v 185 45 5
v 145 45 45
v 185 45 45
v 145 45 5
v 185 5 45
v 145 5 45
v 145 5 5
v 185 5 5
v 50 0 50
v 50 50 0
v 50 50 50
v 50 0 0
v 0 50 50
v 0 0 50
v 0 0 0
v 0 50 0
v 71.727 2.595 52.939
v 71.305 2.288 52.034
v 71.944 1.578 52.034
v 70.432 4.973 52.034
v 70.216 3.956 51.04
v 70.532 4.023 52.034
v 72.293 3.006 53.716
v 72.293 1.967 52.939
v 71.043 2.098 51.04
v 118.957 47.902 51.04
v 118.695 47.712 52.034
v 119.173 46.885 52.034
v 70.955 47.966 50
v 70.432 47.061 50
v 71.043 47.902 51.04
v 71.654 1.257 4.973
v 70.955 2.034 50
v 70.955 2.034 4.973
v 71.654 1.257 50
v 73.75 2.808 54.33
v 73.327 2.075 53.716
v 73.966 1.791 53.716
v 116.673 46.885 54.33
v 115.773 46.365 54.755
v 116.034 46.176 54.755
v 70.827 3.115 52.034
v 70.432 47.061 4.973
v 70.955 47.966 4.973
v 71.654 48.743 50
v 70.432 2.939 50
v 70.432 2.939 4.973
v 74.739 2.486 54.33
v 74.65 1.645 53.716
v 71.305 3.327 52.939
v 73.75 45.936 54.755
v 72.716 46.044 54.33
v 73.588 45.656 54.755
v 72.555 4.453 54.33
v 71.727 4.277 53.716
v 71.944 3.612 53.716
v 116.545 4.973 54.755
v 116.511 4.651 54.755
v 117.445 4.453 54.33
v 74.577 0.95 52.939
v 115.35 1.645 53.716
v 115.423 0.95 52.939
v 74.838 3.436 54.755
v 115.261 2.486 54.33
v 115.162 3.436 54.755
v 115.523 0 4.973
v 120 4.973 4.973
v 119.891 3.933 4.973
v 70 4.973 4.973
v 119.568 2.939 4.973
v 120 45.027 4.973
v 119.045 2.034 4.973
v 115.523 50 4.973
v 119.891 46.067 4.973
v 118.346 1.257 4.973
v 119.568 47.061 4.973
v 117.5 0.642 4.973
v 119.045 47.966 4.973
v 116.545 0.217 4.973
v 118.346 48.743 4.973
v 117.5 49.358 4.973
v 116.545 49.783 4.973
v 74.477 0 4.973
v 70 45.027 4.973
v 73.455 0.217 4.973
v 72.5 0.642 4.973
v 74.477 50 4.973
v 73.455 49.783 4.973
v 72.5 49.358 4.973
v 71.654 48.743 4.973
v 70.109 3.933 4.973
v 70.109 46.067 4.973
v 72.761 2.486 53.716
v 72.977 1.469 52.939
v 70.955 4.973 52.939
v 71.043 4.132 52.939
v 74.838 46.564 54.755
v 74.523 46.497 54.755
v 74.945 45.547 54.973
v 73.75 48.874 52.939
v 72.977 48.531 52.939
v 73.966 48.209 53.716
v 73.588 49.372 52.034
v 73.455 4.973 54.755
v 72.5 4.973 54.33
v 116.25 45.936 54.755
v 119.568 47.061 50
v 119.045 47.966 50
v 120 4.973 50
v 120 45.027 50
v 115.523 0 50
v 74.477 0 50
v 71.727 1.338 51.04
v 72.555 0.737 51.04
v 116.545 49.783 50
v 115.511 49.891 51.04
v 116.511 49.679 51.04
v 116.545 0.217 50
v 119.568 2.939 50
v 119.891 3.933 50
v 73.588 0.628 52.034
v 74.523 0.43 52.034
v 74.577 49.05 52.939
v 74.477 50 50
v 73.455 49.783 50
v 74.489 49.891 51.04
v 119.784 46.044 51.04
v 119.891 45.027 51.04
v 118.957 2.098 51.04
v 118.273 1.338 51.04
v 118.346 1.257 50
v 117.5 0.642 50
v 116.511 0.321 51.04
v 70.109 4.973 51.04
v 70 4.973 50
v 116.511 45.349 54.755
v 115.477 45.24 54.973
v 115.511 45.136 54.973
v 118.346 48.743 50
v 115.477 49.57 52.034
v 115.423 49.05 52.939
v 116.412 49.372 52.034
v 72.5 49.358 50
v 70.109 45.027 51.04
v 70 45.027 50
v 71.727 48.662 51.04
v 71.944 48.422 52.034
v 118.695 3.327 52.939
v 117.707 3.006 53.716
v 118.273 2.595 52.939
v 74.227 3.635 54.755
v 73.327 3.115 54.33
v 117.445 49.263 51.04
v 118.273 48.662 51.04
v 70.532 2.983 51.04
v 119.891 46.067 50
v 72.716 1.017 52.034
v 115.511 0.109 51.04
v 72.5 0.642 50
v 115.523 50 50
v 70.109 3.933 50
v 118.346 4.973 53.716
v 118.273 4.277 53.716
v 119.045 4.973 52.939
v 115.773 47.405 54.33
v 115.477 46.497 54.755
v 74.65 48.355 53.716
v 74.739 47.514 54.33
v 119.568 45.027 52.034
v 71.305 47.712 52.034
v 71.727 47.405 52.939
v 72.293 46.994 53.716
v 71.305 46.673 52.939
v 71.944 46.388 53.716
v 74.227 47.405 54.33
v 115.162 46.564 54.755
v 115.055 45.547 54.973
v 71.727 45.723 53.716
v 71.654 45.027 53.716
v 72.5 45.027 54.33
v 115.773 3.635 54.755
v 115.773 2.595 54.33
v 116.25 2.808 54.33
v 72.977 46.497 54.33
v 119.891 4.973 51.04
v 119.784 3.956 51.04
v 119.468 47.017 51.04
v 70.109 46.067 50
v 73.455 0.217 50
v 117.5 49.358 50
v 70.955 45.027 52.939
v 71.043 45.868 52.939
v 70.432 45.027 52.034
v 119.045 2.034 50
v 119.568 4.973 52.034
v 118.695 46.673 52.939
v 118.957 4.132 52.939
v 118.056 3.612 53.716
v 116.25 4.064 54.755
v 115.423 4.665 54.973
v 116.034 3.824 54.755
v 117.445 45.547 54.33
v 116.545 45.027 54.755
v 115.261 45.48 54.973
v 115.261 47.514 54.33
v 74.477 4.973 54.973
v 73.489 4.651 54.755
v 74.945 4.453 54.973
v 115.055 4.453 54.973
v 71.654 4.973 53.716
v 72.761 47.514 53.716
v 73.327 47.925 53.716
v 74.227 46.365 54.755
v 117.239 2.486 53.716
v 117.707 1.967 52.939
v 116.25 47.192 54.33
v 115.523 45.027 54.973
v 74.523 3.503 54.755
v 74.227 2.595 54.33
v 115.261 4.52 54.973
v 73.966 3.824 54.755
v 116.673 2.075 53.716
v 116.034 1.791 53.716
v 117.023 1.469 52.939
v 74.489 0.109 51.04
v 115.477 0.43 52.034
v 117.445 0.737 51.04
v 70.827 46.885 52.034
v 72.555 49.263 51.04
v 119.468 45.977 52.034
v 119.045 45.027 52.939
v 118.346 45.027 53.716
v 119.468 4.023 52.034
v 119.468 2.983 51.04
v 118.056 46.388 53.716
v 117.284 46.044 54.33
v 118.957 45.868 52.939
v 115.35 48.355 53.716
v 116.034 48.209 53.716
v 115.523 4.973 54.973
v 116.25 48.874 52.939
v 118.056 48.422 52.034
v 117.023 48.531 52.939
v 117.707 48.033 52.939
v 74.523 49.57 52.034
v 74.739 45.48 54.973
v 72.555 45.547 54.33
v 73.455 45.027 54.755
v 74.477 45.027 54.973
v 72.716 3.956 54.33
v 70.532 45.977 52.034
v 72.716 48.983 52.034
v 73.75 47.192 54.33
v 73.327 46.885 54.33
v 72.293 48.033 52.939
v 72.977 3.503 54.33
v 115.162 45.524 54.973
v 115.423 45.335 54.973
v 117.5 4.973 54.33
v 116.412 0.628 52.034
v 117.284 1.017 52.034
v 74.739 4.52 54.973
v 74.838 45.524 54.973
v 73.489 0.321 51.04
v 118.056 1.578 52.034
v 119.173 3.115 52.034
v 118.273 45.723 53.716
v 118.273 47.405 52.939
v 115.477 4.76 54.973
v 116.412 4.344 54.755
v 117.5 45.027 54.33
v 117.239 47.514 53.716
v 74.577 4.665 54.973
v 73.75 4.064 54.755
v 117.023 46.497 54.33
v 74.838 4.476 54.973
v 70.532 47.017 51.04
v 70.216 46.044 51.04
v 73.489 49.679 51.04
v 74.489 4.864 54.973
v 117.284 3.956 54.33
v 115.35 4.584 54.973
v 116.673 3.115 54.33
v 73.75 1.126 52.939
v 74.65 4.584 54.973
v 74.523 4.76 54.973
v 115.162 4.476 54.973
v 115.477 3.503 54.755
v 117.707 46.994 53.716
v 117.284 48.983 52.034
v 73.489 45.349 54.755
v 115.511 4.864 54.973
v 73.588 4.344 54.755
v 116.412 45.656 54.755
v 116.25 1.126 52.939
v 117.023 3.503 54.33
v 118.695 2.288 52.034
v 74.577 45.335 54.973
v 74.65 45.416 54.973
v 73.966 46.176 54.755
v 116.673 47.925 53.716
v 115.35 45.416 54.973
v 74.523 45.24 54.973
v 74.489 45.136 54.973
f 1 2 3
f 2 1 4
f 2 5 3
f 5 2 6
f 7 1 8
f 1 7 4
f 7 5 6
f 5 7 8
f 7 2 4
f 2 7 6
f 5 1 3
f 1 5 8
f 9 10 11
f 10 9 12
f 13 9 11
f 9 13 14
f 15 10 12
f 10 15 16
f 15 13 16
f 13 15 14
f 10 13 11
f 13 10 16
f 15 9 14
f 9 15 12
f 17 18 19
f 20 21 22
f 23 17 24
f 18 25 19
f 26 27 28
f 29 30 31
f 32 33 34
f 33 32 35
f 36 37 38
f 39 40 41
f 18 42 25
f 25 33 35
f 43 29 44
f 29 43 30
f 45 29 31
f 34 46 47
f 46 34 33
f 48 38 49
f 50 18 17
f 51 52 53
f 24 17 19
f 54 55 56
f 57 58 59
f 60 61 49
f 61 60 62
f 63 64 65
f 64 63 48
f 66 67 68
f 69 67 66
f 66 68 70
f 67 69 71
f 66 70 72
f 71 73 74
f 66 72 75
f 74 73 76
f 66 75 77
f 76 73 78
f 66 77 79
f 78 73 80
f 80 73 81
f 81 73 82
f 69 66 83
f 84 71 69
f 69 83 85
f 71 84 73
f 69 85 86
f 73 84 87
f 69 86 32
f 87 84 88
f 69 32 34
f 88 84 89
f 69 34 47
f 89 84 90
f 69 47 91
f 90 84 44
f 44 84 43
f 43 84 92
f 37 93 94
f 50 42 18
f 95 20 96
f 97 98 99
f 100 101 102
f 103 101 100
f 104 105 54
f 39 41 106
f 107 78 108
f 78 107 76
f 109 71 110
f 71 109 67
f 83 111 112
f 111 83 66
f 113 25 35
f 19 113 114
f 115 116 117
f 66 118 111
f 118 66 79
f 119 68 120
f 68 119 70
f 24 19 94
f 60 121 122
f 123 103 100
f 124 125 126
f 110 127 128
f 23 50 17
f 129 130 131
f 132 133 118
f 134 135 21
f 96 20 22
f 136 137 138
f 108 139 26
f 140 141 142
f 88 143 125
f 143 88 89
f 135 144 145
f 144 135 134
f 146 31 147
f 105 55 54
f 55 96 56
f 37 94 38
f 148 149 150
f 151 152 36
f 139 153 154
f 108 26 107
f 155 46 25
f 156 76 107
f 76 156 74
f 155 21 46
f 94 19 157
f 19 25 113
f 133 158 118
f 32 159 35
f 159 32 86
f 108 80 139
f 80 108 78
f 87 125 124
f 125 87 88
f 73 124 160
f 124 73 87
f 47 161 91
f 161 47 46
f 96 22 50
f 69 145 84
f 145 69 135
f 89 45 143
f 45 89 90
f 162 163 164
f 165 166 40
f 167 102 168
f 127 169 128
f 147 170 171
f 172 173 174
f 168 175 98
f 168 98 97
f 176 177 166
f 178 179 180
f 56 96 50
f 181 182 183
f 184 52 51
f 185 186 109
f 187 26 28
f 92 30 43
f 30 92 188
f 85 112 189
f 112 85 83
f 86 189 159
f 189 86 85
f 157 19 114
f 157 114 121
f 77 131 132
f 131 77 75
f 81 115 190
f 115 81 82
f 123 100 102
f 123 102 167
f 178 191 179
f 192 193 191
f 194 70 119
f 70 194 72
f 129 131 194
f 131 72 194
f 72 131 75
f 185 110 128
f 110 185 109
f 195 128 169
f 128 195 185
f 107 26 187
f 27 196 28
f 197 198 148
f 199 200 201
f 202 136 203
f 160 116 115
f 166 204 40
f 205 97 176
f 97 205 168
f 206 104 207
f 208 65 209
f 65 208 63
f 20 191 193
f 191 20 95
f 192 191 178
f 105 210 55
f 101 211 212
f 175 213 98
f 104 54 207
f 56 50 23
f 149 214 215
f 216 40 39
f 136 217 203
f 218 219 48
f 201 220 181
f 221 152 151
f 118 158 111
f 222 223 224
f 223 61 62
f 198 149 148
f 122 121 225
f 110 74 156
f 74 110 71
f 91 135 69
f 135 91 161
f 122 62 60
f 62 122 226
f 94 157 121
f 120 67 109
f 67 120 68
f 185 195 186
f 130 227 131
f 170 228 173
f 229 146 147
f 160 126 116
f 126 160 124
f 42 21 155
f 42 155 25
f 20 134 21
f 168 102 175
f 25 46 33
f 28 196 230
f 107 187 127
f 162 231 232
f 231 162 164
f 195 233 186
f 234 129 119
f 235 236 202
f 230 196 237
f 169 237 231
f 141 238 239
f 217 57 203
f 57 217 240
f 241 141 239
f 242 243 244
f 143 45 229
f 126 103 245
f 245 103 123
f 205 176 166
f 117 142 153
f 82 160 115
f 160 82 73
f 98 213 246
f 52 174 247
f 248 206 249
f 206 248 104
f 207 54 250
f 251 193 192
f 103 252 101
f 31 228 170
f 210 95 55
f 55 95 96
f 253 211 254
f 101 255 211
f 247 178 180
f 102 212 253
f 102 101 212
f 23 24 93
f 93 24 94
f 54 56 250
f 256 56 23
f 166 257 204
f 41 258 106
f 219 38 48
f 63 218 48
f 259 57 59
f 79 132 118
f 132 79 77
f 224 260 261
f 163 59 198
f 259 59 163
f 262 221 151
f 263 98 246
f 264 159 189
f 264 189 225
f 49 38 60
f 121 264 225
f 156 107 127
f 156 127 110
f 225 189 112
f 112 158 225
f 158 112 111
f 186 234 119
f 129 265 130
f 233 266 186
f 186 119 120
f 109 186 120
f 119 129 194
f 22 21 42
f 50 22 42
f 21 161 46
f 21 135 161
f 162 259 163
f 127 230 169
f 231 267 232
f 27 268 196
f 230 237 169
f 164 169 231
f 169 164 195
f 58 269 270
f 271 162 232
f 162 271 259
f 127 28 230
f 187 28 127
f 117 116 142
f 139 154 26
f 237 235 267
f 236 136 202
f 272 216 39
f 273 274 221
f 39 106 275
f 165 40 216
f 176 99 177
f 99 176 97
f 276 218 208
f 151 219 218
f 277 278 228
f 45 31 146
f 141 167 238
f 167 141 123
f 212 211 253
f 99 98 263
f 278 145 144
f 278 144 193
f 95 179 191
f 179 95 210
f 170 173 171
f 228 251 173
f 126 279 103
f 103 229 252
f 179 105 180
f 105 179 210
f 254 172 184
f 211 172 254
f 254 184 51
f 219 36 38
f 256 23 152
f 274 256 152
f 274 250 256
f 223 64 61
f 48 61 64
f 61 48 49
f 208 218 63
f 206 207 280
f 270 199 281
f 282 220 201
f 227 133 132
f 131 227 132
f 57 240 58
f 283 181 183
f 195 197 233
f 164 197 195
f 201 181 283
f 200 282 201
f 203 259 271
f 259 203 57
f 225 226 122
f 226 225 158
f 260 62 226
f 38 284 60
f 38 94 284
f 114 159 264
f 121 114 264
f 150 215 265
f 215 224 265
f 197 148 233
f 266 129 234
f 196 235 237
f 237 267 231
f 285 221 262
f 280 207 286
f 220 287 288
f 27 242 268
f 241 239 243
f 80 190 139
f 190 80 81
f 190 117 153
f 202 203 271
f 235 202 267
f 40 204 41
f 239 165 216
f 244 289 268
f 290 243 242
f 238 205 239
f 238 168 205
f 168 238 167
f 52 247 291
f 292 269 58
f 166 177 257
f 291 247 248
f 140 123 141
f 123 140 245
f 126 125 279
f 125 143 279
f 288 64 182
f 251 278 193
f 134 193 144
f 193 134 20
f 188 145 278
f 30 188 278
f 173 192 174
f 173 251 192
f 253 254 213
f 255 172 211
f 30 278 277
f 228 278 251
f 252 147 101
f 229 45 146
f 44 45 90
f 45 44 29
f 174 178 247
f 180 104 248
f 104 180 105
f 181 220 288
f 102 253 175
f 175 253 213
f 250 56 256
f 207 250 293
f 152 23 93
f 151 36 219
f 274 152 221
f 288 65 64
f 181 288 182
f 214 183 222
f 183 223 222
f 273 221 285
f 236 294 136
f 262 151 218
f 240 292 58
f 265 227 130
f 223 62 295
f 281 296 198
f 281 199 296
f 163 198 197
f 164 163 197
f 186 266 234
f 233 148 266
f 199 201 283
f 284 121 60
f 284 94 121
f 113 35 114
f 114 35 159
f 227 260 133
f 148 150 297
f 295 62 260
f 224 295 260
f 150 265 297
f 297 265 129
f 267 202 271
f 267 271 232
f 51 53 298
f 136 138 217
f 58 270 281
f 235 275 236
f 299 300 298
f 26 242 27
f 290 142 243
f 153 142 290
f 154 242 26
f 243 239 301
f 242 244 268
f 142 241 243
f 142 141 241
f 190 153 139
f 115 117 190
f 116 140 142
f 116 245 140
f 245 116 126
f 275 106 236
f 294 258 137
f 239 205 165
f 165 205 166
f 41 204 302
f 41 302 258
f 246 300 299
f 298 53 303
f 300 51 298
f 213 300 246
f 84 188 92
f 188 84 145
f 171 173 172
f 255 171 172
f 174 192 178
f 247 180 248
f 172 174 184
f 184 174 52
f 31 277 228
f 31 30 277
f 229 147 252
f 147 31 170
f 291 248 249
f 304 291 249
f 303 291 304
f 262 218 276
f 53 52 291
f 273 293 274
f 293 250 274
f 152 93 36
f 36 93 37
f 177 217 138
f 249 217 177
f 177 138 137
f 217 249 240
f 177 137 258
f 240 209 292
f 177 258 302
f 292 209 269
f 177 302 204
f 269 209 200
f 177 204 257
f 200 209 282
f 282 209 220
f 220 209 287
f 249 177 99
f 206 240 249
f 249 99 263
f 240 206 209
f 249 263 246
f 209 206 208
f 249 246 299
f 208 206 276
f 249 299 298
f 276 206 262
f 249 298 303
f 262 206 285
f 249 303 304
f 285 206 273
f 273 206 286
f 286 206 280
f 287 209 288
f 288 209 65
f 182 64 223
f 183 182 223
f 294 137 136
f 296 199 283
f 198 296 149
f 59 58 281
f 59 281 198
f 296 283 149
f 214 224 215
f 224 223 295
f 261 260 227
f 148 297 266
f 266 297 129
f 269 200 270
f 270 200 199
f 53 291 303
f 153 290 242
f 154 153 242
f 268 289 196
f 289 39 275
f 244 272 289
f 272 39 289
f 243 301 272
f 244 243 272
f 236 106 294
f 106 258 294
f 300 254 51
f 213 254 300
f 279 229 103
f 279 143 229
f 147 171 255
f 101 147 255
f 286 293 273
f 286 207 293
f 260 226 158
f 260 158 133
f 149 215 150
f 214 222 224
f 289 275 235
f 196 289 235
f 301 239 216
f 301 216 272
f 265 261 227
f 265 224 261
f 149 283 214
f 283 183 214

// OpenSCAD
INFINITY = 10000;
ATOM = .01;

module chamfer_tool(r, fn, tool,
                    ax, ay, az,
                    ax2, ay2, az2,
                    ax3, ay3, az3) {
    rotate([ax3, ay3, az3])
    rotate([ax2, ay2, az2])
    rotate([ax, ay, az]) {
        if (tool=="sphere") {
            sphere(r, $fn=fn);
        }
        else if (tool=="hemisphere-up") {
            intersection() {
                sphere(r, $fn=fn);
                cylinder(r=r*2, h=r*2);
            }
        }
        else if (tool=="hemisphere-down") {
            difference() {
                sphere(r, $fn=fn);
                cylinder(r=r*2, h=r*2);
            }
        }
        else if (tool=="cone") {
            cylinder(r, r, 0, $fn=fn);
            scale([1, 1, -1])
            cylinder(r, r, 0, $fn=fn);
        }
        else if (tool=="cone-up") {
            cylinder(r, r, 0, $fn=fn, center=true);
        }
        else if (tool=="cone-down") {
            scale([1, 1, -1])
            cylinder(r, r, 0, $fn=fn, center=true);
        }
        else if (tool=="octahedron") {
            resize([r*2, r*2, r*2]) {
                cylinder(r, r, 0, $fn=4);
                scale([1, 1, -1])
                cylinder(r, r, 0, $fn=4);
            }
        }
        else if (tool=="pyramid") {
            resize([r*2, r*2, r*2]) {
                cylinder(r, r, 0, center=true, $fn=4);
            }
        }
        else if (tool=="rpyramid") {
            resize([r*2, r*2, r*2]) {
                cylinder(r, 0, r, center=true, $fn=4);
            }
        }
        else if (tool=="cylinder-z" || tool=="cylinder") {
            cylinder(r=r, h=ATOM, $fn=fn, center=true);
        }
        else if (tool=="cylinder-x") {
            rotate([0, 90, 0])
            cylinder(r=r, h=ATOM, $fn=fn, center=true);
        }
        else if (tool=="cylinder-y") {
            rotate([90, 0, 0])
            cylinder(r=r, h=ATOM, $fn=fn, center=true);
        }
        else if (tool=="cube") {
            cube(r*2, center=true);
        }
        else if (tool=="plate-y") {
            cube([r*2, ATOM, r*2], center=true);
        }
        else if (tool=="plate-z") {
            cube([r*2, r*2, ATOM], center=true);
        }
        else {
            assert(false, str("Unknown tool: ", tool));
        }
    }
}

module shrinker(r, tool, fn,
                ax, ay, az,
                ax2, ay2, az2,
                ax3, ay3, az3) {
    if (!r) {
        children();
    }
    else {
        // re-invert+grow = fillet
        difference() {
            cube(INFINITY/2, center=true);

            // invert+grow = carve
            minkowski() {
                difference() {
                    cube(INFINITY, center=true);
                    children();
                }
                //cube(r, center=true);
                chamfer_tool(r, fn, tool,
                             ax, ay, az,
                             ax2, ay2, az2,
                             ax3, ay3, az3);
            }
        }
    }
}

module chamferer(r, tool="sphere", fn=8, shrink=true, grow=true,
                 ax=0, ay=0, az=0,
                 ax2=0, ay2=0, az2=0,
                 ax3=0, ay3=0, az3=0,
) {
    if (!r) {
        children();
    }
    else {
        minkowski() {
            if (shrink)
                shrinker(r, tool, fn,
                         ax, ay, az,
                         ax2, ay2, az2,
                         ax3, ay3, az3) children();
            else
                children();
            
            if (grow)
                chamfer_tool(r, fn, tool,
                             ax, ay, az,
                             ax2, ay2, az2,
                             ax3, ay3, az3);
        }
    }
}



cube(50);

translate([70, 0, 0])
chamferer(5, "hemisphere-up", $preview? 6*4 : 30)
//shrinker(5, "sphere", $preview? 6*4 : 30)
cube(50);

translate([70*2, 0, 0])
chamferer(5, "octahedron", grow=false)
cube(50);
